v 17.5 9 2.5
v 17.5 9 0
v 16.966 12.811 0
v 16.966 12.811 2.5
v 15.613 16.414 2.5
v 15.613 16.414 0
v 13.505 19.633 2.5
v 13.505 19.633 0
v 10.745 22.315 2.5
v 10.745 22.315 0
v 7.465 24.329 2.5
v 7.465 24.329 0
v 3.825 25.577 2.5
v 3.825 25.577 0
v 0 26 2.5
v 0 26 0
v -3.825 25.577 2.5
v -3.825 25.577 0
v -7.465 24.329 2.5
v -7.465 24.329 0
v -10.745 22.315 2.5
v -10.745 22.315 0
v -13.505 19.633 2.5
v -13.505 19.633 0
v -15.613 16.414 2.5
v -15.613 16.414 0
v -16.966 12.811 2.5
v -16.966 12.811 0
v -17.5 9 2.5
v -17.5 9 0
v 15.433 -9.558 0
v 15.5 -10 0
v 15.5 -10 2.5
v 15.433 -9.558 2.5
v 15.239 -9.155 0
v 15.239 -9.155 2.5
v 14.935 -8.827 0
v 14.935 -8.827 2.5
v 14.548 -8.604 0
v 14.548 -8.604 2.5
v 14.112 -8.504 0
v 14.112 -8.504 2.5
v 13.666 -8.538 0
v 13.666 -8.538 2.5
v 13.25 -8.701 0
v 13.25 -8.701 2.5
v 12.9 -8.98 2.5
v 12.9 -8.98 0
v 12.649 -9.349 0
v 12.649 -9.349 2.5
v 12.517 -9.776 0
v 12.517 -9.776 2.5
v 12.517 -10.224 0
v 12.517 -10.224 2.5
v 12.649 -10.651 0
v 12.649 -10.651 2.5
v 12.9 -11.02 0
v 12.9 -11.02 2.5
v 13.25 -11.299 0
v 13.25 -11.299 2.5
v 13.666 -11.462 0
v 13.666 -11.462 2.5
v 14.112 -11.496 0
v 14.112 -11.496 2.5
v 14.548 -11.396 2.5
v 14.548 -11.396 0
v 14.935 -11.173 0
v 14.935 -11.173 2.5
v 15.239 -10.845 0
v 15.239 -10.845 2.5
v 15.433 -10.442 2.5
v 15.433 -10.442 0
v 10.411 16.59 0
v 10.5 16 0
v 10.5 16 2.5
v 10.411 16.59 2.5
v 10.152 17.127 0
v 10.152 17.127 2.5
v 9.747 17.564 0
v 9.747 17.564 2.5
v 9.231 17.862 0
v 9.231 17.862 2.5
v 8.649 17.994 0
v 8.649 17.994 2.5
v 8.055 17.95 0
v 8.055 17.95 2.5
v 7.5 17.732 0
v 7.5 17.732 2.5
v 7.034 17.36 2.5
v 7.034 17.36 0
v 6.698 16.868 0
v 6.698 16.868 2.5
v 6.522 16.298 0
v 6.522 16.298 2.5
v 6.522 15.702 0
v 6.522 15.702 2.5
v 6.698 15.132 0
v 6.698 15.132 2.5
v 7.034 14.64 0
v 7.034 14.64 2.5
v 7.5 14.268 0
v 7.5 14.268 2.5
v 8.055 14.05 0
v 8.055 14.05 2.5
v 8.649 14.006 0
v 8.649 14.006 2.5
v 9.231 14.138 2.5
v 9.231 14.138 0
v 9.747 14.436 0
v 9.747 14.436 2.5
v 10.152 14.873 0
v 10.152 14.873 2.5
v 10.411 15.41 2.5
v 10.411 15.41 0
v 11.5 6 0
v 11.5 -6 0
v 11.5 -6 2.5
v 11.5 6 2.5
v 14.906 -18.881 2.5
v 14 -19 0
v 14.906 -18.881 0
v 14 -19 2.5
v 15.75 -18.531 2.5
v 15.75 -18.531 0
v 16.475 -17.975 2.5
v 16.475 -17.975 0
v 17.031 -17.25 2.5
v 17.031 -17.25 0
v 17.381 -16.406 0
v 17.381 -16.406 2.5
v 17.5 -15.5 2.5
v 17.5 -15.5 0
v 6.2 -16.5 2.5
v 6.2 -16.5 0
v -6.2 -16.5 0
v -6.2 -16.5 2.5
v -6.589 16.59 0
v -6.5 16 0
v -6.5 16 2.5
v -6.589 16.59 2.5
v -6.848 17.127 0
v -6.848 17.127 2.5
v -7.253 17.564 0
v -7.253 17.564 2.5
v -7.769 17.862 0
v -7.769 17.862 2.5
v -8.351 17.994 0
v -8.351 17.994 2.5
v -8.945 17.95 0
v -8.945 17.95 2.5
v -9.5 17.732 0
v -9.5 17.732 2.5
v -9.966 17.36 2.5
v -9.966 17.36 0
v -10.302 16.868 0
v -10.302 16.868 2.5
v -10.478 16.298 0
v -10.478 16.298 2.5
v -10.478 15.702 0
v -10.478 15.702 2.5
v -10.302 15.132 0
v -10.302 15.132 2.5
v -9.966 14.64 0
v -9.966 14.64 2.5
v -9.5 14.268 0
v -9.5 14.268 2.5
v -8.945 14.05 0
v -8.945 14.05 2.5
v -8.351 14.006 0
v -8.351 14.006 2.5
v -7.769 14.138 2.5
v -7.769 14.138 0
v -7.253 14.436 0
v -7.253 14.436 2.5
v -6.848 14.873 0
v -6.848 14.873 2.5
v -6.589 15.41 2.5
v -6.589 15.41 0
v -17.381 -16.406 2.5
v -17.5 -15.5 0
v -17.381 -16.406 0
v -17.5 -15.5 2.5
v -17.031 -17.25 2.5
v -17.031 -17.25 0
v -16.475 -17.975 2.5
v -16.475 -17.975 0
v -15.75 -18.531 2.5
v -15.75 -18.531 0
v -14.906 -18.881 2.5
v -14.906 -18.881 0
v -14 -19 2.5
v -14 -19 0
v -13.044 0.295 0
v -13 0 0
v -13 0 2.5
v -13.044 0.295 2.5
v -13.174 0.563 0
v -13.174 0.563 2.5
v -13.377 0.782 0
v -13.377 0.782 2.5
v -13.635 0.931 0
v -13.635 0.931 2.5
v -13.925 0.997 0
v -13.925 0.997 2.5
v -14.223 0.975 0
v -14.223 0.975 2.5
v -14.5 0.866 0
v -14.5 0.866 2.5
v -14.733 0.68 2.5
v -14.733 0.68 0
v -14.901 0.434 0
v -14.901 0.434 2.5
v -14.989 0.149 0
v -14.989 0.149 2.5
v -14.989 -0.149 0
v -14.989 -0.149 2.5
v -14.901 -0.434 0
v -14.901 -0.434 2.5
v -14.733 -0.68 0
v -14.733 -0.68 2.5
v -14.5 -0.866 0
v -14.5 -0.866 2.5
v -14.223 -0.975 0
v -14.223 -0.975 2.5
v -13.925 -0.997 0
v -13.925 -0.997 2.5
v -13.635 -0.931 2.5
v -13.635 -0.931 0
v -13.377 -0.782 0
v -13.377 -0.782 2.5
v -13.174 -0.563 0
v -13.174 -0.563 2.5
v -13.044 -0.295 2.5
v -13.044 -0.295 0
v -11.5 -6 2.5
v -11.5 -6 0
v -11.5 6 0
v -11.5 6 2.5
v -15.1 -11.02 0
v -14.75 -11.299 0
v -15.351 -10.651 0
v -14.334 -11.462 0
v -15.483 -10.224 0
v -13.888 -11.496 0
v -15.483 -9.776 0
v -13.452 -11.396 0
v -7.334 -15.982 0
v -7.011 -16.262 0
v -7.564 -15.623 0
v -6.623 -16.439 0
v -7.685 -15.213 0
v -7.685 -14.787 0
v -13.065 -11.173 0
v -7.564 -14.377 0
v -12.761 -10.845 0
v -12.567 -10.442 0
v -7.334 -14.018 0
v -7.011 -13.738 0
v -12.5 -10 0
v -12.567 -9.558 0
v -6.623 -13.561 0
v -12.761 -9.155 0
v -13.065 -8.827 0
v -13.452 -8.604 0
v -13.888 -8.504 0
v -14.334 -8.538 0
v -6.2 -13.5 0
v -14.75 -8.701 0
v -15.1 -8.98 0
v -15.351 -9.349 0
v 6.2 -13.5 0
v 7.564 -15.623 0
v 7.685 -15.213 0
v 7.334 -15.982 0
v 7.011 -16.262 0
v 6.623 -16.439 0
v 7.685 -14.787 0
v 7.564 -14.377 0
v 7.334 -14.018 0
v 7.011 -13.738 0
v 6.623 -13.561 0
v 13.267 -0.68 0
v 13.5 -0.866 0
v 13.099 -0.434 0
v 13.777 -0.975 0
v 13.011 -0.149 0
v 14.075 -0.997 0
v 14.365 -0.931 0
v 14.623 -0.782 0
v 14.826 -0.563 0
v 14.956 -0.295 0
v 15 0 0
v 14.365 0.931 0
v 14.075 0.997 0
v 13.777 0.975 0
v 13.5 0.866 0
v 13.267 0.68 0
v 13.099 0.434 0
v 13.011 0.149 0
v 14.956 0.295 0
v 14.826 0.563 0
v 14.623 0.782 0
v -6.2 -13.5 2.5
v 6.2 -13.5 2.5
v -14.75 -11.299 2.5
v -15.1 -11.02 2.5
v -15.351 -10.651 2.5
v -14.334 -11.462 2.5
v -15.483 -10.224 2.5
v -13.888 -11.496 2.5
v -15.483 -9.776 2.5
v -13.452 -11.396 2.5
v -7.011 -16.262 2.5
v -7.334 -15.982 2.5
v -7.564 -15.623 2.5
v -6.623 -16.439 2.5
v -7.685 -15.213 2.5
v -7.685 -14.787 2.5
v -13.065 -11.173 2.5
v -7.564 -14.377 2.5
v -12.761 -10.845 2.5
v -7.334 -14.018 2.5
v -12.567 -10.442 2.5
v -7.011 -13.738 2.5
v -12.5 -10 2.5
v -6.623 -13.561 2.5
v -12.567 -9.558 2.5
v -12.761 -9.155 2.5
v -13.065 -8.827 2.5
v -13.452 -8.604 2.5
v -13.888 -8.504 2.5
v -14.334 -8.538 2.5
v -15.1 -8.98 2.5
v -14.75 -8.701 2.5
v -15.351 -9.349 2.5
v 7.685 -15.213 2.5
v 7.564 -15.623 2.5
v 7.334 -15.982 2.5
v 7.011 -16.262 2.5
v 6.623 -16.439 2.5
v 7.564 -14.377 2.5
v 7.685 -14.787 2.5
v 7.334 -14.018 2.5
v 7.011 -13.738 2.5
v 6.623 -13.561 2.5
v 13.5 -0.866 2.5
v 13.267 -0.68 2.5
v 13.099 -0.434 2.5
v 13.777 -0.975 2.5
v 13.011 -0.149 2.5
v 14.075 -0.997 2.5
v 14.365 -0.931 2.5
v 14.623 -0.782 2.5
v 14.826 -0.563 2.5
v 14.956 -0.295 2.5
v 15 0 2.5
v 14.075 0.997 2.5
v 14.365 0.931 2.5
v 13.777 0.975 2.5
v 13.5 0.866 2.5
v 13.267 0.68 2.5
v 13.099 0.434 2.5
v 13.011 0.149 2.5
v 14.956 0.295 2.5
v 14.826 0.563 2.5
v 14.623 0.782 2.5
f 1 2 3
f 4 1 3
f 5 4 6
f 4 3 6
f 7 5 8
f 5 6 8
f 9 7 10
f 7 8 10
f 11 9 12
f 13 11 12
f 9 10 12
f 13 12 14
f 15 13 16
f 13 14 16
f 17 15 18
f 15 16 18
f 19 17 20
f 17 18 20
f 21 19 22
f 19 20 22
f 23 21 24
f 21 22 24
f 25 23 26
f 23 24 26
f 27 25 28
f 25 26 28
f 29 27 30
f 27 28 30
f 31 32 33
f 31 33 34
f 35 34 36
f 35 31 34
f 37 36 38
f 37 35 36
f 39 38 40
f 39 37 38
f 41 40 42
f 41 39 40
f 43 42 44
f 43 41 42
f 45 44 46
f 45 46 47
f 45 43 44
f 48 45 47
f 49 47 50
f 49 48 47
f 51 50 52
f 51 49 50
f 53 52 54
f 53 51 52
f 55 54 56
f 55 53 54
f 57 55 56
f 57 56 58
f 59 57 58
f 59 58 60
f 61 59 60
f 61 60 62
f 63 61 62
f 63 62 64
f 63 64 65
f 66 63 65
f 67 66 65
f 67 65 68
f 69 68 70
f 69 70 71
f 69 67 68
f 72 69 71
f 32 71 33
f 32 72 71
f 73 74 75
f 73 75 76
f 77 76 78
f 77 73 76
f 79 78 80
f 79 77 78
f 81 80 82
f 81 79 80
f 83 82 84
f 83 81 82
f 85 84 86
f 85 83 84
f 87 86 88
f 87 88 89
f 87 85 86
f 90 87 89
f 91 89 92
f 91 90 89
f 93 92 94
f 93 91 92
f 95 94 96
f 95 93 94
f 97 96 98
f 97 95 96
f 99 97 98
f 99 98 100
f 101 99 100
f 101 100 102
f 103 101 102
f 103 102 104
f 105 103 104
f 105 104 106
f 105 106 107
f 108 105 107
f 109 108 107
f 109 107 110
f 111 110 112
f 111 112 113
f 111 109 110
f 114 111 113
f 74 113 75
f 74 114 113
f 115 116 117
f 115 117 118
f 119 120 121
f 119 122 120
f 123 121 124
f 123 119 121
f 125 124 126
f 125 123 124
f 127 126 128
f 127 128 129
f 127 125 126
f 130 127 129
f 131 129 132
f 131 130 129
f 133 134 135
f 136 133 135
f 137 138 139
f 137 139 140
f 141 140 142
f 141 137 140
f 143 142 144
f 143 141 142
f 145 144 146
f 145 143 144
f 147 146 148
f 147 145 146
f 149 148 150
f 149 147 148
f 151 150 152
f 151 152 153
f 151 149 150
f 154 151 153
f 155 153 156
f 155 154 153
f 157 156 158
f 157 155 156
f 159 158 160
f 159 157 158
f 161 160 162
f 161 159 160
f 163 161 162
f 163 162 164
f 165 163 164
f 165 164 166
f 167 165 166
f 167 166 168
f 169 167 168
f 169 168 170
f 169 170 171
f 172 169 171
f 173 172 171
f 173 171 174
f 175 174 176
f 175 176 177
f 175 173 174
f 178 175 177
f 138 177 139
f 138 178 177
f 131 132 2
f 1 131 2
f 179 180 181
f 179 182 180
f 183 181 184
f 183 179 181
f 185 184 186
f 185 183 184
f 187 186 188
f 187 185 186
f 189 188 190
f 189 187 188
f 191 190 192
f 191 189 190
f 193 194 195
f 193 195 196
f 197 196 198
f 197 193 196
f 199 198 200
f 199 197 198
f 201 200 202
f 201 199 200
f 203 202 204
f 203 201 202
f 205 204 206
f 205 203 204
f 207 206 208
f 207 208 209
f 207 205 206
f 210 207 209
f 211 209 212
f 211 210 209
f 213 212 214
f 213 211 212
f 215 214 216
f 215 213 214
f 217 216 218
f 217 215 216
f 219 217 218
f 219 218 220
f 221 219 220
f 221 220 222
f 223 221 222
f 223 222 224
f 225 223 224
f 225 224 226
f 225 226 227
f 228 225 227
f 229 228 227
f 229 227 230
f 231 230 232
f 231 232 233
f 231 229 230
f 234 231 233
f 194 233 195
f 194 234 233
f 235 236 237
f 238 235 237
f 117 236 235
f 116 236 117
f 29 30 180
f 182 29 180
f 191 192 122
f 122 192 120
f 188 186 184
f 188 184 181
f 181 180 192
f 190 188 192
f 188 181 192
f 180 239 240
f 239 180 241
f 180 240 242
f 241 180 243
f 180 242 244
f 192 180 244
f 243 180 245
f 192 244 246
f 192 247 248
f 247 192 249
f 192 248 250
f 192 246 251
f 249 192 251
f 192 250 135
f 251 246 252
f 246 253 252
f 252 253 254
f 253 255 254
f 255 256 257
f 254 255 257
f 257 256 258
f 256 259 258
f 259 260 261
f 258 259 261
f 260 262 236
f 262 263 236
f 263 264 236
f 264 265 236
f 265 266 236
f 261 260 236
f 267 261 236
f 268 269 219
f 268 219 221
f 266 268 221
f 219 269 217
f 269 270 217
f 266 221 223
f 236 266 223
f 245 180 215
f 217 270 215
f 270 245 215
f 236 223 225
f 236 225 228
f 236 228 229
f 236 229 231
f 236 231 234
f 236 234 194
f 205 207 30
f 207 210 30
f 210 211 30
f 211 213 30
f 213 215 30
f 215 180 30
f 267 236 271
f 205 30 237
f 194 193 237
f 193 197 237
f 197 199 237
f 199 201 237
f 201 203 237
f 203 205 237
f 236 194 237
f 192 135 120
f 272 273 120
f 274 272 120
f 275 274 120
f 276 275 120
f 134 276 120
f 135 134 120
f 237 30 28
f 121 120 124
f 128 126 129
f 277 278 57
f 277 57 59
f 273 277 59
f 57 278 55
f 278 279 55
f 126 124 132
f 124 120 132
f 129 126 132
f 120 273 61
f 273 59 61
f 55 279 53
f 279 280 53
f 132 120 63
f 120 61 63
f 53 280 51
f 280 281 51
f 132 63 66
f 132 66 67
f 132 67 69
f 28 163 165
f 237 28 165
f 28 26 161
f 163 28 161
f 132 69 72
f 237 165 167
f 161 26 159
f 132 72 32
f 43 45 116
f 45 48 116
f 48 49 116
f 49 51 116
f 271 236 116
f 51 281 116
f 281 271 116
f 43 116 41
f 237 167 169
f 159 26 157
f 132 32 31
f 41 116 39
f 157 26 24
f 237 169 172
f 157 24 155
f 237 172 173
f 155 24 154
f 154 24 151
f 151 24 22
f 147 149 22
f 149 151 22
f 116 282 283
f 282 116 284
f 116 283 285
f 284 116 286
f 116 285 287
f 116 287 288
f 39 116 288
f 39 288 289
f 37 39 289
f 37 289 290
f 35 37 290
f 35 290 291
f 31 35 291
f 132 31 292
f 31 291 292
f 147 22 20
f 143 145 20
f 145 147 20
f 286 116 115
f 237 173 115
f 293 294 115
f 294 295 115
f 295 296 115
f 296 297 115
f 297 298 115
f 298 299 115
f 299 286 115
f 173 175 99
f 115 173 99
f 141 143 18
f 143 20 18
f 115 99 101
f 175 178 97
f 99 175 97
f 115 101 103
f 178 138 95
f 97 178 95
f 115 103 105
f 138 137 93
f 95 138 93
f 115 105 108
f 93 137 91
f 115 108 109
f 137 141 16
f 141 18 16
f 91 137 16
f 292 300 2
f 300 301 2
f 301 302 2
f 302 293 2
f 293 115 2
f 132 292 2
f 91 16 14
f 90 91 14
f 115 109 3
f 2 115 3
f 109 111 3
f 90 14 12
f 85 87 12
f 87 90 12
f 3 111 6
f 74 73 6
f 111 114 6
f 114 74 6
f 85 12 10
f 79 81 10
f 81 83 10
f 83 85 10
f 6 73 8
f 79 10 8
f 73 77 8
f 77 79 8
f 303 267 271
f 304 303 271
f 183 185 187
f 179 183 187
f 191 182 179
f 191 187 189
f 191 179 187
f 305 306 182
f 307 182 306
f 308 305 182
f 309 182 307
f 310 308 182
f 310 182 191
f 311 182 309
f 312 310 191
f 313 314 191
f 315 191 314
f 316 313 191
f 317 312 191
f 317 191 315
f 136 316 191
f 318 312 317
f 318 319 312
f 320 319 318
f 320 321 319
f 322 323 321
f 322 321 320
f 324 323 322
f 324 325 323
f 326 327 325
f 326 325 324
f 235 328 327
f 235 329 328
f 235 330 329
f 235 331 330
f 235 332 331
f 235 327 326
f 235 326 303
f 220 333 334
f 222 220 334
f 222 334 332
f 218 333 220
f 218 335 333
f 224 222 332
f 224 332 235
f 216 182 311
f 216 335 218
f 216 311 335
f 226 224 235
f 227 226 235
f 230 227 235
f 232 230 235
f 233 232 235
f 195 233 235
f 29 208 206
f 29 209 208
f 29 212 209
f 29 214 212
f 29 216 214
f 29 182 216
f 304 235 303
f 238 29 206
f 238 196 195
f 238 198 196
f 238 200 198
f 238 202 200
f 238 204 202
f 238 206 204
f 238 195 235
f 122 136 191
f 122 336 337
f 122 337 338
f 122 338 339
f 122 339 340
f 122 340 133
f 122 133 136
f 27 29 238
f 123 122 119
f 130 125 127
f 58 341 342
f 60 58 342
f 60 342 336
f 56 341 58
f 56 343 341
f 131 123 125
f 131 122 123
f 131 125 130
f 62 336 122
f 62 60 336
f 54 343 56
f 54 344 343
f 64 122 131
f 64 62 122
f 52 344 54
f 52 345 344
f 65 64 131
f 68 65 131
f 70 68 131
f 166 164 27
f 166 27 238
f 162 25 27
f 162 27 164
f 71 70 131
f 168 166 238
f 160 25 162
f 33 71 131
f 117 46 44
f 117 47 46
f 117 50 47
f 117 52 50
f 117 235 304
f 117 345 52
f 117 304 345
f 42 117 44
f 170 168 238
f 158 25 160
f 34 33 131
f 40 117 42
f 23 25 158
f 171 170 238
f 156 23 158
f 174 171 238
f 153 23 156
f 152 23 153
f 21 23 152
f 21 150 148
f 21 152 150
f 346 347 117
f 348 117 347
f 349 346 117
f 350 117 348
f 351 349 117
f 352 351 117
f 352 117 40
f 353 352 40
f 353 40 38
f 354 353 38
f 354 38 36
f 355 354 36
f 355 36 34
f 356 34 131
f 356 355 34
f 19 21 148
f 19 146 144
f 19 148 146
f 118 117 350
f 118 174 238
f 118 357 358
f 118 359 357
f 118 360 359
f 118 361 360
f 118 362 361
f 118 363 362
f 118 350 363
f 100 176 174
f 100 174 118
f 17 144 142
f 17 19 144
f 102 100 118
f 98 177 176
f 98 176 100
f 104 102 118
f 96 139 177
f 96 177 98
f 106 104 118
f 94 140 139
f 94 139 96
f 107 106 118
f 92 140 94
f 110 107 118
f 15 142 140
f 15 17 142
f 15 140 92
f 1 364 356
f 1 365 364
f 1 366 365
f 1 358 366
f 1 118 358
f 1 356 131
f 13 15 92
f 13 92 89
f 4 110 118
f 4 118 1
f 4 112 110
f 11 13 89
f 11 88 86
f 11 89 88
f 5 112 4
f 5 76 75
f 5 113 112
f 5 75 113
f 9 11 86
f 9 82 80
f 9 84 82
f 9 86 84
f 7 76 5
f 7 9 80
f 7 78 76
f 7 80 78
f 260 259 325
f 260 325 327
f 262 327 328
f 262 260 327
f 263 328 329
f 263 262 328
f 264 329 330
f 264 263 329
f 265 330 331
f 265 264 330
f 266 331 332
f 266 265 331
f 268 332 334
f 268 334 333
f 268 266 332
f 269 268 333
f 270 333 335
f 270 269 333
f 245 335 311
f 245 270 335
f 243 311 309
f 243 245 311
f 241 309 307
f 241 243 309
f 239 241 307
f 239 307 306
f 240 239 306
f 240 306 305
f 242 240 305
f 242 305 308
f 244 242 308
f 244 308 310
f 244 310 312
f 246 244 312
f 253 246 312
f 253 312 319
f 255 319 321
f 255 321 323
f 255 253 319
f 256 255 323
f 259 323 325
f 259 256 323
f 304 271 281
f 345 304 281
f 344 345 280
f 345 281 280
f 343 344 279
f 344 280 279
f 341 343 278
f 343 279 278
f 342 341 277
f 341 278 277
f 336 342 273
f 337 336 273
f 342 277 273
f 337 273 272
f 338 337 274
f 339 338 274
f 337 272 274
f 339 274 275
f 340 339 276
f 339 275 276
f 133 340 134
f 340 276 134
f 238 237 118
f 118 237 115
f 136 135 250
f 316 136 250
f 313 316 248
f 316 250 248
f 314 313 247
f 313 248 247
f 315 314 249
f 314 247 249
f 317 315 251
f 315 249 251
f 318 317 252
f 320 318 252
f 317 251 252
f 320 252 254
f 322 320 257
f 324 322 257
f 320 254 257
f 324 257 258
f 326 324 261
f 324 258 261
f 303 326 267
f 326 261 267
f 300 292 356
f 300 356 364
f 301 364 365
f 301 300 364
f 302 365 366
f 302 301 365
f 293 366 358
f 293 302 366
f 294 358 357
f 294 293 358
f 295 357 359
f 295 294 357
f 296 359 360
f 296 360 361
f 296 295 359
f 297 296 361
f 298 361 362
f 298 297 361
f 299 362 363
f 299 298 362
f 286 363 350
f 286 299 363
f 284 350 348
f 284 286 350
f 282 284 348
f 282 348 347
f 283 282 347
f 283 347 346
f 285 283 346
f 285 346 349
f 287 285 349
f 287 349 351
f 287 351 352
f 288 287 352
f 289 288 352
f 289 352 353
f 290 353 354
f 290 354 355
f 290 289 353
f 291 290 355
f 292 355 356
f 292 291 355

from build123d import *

# Parameters (mm, degrees)
SKETCH1_R           = 1
SKETCH1_R_2         = 1.5
SKETCH1_R_3         = 2
SKETCH1_W           = 23
SKETCH1_H           = 12
BOSS_EXTRUDE1_DEPTH = 2.5
FILLET1_R           = 3.5


with BuildPart() as part:
    # Sketch1 → Boss-Extrude1 (new body)
    with BuildSketch(Plane.XY):
        with BuildLine():
            Line((-17.5, 9), (-17.5, -19))
            Line((-17.5, -19), (17.5, -19))
            Line((17.5, -19), (17.5, 9))
            ThreePointArc((17.5, 9), (0, 26), (-17.5, 9))
        make_face()
        with Locations((-14, 0)):
            Circle(SKETCH1_R, mode=Mode.SUBTRACT)
        with Locations((-14, -10)):
            Circle(SKETCH1_R_2, mode=Mode.SUBTRACT)
        with Locations((-8.5, 16)):
            Circle(SKETCH1_R_3, mode=Mode.SUBTRACT)
        with Locations((14, -10)):
            Circle(SKETCH1_R_2, mode=Mode.SUBTRACT)
        with Locations((14, 0)):
            Circle(SKETCH1_R, mode=Mode.SUBTRACT)
        with Locations((8.5, 16)):
            Circle(SKETCH1_R_3, mode=Mode.SUBTRACT)
        Rectangle(SKETCH1_W, SKETCH1_H, mode=Mode.SUBTRACT)
        with BuildLine():
            Line((-6.2, -13.5), (6.2, -13.5))
            ThreePointArc((6.2, -13.5), (7.7, -15), (6.2, -16.5))
            Line((6.2, -16.5), (-6.2, -16.5))
            ThreePointArc((-6.2, -16.5), (-7.7, -15), (-6.2, -13.5))
        make_face(mode=Mode.SUBTRACT)
    extrude(amount=BOSS_EXTRUDE1_DEPTH)

    # Fillet1
    fillet1_edges = [part.edges().sort_by_distance(p)[0] for p in [
        (17.5, -19, 1.25),
        (-17.5, -19, 1.25),
    ]]
    fillet(fillet1_edges, radius=FILLET1_R)


solid = part.part
